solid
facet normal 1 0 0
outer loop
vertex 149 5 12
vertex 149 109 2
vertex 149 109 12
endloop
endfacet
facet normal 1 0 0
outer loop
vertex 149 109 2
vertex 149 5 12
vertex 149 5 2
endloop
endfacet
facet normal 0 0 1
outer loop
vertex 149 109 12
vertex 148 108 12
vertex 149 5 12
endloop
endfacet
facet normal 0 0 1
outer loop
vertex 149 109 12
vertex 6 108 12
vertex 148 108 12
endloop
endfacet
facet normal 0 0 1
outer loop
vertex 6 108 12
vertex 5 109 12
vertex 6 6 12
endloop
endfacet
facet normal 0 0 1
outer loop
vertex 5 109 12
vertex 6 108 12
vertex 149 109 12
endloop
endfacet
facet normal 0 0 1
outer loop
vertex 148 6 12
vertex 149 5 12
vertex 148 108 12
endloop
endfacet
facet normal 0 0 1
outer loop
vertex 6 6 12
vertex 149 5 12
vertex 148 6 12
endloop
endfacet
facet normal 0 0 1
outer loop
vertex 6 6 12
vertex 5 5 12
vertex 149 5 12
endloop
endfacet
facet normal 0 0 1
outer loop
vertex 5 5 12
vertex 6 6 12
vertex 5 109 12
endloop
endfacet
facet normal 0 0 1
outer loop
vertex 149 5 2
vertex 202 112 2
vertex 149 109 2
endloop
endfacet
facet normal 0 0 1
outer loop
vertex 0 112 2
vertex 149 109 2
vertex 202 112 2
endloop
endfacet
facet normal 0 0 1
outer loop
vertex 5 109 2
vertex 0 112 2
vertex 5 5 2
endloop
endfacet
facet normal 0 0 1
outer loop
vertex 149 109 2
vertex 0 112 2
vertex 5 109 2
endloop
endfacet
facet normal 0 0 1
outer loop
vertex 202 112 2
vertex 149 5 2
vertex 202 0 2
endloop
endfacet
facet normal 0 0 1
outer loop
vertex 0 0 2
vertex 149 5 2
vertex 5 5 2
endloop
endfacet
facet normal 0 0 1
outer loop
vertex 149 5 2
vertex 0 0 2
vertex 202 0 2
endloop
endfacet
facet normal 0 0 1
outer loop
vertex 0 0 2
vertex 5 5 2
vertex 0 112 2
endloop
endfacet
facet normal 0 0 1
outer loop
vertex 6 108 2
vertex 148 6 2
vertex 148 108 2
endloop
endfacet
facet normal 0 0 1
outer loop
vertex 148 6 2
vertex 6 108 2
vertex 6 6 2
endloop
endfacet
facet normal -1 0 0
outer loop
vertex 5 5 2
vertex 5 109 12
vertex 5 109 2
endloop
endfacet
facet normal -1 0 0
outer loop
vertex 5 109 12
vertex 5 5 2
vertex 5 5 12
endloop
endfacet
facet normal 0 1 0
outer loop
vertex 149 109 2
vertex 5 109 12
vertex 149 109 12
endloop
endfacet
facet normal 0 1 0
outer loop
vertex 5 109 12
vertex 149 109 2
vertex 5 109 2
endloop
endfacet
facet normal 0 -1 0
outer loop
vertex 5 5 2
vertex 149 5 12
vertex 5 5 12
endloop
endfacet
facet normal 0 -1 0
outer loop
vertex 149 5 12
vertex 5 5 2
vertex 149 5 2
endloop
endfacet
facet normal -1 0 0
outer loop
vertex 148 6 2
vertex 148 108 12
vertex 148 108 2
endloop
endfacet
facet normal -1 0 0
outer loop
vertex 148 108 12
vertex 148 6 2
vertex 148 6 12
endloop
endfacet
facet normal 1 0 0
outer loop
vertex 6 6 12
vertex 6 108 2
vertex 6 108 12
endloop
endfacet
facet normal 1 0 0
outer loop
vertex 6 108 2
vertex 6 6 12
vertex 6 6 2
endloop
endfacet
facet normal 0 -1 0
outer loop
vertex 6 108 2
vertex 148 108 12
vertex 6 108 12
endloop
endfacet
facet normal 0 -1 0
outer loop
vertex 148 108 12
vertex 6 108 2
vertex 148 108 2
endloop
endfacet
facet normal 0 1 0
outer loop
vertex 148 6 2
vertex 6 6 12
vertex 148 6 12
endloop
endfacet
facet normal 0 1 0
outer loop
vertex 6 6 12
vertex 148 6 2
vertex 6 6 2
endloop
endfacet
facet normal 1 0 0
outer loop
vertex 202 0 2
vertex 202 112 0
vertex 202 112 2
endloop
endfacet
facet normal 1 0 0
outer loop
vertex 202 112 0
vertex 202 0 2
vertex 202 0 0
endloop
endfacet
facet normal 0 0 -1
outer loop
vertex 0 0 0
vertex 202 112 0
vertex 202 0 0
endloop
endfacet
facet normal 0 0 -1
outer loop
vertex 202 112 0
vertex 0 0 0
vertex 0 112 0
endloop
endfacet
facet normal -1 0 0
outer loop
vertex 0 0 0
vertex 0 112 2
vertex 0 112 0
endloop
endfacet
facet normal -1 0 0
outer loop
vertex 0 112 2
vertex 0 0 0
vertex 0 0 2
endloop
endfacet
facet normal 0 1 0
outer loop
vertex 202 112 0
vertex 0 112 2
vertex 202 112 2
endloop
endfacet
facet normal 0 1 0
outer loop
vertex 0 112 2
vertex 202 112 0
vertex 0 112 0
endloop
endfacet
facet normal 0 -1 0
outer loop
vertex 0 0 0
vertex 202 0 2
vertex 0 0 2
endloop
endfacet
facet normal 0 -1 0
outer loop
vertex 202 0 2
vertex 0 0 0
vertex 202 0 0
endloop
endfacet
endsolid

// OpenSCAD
oil_vessel_length = 142;
oil_vessel_width = 102;
oil_vessel_height = 10;
t_length = 38.0;
t_width = 30.0;
b_length = 45;
b_width = 33;
margin = 5;
total_length = (margin + oil_vessel_length +
                margin + b_length + margin);
total_width = oil_vessel_width + margin*2;
thickness = 2;
wall_width = 1;
fn = 128;

module render() {
  union() {
    cube([total_length, total_width, thickness]);
    translate([margin, margin, thickness]) {
      difference() {
        cube([oil_vessel_length + wall_width*2,
              oil_vessel_width + wall_width*2,
              oil_vessel_height]);
        translate([wall_width, wall_width, 0])
        cube([oil_vessel_length,
              oil_vessel_width,
              oil_vessel_height]);
      }
    }
  }
}

echo(version=version());

render();
